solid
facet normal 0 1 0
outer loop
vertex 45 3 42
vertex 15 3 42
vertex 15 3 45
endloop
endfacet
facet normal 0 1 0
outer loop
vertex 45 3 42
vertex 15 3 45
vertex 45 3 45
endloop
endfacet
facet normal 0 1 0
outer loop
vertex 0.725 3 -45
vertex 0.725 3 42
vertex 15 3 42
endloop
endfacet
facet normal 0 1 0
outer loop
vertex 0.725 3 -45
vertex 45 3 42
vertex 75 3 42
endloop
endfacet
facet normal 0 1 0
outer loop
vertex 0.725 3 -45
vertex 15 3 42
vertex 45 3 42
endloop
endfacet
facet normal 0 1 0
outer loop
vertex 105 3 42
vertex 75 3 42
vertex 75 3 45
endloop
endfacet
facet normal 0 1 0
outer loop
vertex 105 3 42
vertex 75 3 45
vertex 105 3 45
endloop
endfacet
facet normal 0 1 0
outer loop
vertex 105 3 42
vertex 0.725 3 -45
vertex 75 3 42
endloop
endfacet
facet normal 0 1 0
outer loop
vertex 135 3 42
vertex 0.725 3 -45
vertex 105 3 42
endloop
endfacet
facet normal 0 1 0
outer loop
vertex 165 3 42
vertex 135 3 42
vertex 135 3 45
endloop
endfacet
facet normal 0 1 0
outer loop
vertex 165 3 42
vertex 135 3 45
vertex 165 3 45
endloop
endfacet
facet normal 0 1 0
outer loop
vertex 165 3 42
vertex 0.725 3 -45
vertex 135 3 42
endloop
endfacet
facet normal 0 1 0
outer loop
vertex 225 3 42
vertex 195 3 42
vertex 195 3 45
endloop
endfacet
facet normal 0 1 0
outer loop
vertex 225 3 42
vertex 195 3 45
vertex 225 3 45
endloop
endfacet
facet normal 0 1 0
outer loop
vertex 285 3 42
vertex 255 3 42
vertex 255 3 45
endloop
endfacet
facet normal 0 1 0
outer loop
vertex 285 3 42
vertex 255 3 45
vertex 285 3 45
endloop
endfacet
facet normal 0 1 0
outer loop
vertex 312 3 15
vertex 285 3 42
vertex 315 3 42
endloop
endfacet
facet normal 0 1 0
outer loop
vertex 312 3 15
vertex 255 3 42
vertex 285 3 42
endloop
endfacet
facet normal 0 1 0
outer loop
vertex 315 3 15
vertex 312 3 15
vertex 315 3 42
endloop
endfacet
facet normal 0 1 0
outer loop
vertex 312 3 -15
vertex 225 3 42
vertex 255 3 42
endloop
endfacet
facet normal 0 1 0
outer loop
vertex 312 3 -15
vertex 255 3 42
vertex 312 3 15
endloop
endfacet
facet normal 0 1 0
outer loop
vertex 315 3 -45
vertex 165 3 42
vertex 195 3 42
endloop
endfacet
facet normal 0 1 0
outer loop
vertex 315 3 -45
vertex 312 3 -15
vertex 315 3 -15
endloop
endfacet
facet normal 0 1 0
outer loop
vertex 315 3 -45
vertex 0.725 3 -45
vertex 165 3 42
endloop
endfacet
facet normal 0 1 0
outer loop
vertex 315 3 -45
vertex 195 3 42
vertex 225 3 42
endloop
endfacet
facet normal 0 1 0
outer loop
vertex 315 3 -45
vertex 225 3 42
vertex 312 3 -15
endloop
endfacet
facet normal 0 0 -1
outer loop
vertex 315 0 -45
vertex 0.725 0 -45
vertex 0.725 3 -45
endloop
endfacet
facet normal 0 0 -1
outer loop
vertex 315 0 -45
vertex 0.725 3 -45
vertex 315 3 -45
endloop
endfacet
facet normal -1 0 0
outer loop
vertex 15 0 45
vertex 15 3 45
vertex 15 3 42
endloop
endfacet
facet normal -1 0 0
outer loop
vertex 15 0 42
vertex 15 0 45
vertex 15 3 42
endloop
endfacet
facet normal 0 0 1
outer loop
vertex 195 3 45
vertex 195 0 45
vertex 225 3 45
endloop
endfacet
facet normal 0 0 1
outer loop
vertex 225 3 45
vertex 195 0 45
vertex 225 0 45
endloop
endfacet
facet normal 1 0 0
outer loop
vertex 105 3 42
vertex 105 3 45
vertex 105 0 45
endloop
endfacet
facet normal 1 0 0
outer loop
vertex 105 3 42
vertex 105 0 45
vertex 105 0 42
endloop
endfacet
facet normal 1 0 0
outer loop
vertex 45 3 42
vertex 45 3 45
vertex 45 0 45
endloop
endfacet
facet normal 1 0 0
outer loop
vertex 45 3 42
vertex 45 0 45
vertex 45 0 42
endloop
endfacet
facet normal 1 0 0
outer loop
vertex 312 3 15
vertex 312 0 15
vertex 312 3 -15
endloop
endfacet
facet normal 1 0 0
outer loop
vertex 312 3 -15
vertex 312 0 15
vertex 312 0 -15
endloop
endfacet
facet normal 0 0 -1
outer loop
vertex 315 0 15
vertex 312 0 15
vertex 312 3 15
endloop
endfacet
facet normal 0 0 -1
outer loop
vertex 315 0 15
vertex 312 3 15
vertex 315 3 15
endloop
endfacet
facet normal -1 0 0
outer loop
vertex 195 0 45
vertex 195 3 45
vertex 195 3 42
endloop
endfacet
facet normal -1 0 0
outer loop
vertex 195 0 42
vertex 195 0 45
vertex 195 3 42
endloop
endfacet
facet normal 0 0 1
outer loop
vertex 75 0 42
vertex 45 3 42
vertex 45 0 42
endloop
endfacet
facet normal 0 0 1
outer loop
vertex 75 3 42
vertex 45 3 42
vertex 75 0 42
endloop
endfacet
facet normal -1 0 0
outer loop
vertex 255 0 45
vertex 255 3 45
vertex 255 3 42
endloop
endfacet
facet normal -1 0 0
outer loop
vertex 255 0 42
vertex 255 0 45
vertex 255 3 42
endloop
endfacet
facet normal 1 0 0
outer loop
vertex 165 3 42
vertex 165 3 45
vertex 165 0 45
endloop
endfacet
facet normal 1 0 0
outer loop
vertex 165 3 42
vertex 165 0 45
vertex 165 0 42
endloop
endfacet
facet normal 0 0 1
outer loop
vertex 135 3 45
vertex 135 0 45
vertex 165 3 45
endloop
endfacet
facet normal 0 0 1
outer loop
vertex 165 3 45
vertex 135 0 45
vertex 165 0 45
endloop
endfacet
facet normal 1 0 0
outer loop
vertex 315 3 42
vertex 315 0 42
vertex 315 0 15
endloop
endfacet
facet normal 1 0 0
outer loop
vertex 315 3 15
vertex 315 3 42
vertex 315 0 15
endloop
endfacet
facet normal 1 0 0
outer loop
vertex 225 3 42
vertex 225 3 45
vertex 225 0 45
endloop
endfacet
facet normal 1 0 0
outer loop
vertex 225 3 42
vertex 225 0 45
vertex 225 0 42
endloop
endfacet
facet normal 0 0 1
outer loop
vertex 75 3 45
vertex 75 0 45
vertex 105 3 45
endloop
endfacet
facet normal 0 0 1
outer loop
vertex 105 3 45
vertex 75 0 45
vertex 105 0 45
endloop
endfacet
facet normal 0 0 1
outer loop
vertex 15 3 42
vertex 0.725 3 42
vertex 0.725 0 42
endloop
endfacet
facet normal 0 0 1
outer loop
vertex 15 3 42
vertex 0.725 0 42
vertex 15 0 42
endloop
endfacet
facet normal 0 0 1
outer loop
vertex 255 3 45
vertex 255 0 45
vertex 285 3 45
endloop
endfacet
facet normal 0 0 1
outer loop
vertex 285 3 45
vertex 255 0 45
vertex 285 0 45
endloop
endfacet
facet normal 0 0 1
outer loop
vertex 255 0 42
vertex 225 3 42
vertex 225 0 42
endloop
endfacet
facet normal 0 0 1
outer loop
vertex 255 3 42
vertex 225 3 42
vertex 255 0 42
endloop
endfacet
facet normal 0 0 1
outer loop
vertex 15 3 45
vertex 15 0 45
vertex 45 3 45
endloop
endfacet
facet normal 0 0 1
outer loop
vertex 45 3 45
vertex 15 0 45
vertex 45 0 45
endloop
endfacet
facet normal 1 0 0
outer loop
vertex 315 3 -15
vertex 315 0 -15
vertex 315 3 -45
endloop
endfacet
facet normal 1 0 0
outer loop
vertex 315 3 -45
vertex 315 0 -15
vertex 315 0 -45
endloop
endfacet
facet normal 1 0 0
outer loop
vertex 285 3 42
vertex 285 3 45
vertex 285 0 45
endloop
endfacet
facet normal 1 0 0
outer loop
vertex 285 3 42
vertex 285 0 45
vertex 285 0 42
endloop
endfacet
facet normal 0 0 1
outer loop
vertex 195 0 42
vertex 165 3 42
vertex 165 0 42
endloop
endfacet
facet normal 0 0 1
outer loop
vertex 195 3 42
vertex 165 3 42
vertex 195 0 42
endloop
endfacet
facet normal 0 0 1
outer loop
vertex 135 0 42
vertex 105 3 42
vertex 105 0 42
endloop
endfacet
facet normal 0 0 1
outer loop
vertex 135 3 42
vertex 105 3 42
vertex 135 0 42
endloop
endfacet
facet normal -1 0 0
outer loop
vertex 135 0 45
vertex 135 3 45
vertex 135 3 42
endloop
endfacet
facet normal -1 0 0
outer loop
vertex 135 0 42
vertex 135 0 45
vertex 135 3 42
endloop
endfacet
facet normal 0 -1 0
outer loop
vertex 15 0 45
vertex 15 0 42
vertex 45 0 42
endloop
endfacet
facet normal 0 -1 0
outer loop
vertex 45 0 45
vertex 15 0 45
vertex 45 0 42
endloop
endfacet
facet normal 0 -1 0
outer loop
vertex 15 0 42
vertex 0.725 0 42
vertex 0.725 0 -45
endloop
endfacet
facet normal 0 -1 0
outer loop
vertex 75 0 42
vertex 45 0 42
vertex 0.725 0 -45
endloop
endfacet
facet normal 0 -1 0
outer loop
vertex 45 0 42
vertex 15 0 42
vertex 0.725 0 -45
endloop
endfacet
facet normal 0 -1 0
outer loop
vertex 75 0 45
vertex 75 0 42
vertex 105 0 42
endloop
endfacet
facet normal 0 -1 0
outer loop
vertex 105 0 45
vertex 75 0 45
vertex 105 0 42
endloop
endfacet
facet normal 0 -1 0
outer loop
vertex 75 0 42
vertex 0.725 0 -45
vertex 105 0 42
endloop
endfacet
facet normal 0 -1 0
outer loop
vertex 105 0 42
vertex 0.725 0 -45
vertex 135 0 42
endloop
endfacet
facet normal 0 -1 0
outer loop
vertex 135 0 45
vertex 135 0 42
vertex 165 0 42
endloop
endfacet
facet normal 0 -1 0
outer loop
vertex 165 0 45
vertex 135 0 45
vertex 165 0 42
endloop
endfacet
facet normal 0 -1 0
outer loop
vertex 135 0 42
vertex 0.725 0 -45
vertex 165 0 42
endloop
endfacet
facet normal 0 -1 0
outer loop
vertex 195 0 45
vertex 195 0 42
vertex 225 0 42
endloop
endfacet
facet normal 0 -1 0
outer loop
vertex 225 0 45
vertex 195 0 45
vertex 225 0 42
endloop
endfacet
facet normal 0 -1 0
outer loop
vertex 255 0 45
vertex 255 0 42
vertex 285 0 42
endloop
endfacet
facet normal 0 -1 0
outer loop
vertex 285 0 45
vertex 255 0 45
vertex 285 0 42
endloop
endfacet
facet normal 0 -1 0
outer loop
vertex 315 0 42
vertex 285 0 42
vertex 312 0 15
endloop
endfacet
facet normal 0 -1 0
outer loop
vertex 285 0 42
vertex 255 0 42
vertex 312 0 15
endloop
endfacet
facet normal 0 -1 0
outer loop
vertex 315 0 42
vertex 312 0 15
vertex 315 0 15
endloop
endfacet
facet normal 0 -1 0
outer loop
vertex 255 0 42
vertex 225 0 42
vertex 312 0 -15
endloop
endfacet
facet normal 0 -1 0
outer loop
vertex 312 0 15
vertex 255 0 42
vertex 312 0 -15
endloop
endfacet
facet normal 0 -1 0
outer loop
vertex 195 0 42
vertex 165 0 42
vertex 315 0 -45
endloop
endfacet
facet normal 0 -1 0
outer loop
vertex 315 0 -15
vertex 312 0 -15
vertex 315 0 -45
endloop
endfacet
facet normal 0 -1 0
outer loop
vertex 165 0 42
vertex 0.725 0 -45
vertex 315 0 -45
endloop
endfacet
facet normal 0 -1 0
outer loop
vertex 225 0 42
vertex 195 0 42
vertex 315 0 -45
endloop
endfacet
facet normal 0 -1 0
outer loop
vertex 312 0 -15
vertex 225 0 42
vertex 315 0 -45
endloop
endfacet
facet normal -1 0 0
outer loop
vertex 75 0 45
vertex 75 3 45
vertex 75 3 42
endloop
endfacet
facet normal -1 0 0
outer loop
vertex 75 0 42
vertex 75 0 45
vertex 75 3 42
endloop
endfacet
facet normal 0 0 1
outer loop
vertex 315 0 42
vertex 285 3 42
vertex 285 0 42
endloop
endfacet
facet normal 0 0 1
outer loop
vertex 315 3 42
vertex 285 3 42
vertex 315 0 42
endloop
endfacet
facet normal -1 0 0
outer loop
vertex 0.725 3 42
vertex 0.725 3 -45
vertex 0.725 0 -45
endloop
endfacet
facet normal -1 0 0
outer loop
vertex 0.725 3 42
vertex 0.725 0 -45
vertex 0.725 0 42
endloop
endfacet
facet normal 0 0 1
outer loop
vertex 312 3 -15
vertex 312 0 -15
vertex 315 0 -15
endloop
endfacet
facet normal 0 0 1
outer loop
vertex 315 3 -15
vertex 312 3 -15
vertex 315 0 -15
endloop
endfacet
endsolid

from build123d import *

# Parameters (mm, degrees)
SKETCH1_W              = 630
SKETCH1_H              = 90
BOSS_EXTRUDE1_DEPTH    = 3
SKETCH3_W              = 30
SKETCH3_H              = 3
CUT_EXTRUDE1_DEPTH     = 3
LPATTERN1_COUNT        = 10
LPATTERN1_PITCH        = 60
LPATTERN1_COL_COUNT    = 2
LPATTERN1_COL_PITCH    = 60
CUT_EXTRUDE5_START     = -3
CUT_EXTRUDE5_OUTLINE_W = 3
CUT_EXTRUDE5_OUTLINE_H = 30
CUT_EXTRUDE5_DEPTH     = 3
SKETCH7_W              = 3
SKETCH7_H              = 30
CUT_EXTRUDE3_DEPTH     = 3
SKETCH13_W             = 3
SKETCH13_H             = 27
CUT_EXTRUDE4_DEPTH     = 10


# Read off the part's stored shape, not the designer's step: Cut-Extrude5
with BuildPart() as part:
    # Sketch1 → Boss-Extrude1 (new body)
    with BuildSketch(Plane(origin=(0, 0, 0), x_dir=(1, 0, 0), z_dir=(0, 1, 0))):
        Rectangle(SKETCH1_W, SKETCH1_H)
    extrude(amount=BOSS_EXTRUDE1_DEPTH)

    # Sketch3 → Cut-Extrude1 (cut)
    with BuildSketch(Plane(origin=(0, 3, 0), x_dir=(1, 0, 0), z_dir=(0, 1, 0))):
        with Locations((-240, -43.5)):
            Rectangle(SKETCH3_W, SKETCH3_H)
    cut_extrude1 = extrude(amount=-CUT_EXTRUDE1_DEPTH, mode=Mode.SUBTRACT)

    # LPattern1: Cut-Extrude1 ×10
    with Locations(*[(i * LPATTERN1_PITCH, 0, 0) for i in range(1, LPATTERN1_COUNT)]):
        add(cut_extrude1, mode=Mode.SUBTRACT)

    # LPattern1 col: Cut-Extrude1 ×2
    with Locations(*[(-i * LPATTERN1_COL_PITCH, 0, 0) for i in range(1, LPATTERN1_COL_COUNT)]):
        add(cut_extrude1, mode=Mode.SUBTRACT)

    # Cut-Extrude5 outline → Cut-Extrude5 (cut)
    with BuildSketch(Plane(origin=(0, 3, 0), x_dir=(1, 0, 0), z_dir=(0, 1, 0)).offset(CUT_EXTRUDE5_START)):
        with Locations((313.5, 1e-09)):
            Rectangle(CUT_EXTRUDE5_OUTLINE_W, CUT_EXTRUDE5_OUTLINE_H)
    extrude(amount=CUT_EXTRUDE5_DEPTH, mode=Mode.SUBTRACT)

    # Sketch7 → Cut-Extrude3 (cut)
    with BuildSketch(Plane(origin=(0, 3, 0), x_dir=(1, 0, 0), z_dir=(0, 1, 0))):
        with Locations((-313.5, 30)):
            Rectangle(SKETCH7_W, SKETCH7_H)
    extrude(amount=-CUT_EXTRUDE3_DEPTH, mode=Mode.SUBTRACT)

    # Sketch13 → Cut-Extrude4 (cut)
    with BuildSketch(Plane(origin=(0, 3, 0), x_dir=(1, 0, 0), z_dir=(0, 1, 0))):
        with Locations((-313.5, -28.5)):
            Rectangle(SKETCH13_W, SKETCH13_H)
    extrude(amount=-CUT_EXTRUDE4_DEPTH, mode=Mode.SUBTRACT)

    # SurfaceCut1
    split(bisect_by=Plane.ZY.offset(-0.725), keep=Keep.BOTTOM)


solid = part.part
